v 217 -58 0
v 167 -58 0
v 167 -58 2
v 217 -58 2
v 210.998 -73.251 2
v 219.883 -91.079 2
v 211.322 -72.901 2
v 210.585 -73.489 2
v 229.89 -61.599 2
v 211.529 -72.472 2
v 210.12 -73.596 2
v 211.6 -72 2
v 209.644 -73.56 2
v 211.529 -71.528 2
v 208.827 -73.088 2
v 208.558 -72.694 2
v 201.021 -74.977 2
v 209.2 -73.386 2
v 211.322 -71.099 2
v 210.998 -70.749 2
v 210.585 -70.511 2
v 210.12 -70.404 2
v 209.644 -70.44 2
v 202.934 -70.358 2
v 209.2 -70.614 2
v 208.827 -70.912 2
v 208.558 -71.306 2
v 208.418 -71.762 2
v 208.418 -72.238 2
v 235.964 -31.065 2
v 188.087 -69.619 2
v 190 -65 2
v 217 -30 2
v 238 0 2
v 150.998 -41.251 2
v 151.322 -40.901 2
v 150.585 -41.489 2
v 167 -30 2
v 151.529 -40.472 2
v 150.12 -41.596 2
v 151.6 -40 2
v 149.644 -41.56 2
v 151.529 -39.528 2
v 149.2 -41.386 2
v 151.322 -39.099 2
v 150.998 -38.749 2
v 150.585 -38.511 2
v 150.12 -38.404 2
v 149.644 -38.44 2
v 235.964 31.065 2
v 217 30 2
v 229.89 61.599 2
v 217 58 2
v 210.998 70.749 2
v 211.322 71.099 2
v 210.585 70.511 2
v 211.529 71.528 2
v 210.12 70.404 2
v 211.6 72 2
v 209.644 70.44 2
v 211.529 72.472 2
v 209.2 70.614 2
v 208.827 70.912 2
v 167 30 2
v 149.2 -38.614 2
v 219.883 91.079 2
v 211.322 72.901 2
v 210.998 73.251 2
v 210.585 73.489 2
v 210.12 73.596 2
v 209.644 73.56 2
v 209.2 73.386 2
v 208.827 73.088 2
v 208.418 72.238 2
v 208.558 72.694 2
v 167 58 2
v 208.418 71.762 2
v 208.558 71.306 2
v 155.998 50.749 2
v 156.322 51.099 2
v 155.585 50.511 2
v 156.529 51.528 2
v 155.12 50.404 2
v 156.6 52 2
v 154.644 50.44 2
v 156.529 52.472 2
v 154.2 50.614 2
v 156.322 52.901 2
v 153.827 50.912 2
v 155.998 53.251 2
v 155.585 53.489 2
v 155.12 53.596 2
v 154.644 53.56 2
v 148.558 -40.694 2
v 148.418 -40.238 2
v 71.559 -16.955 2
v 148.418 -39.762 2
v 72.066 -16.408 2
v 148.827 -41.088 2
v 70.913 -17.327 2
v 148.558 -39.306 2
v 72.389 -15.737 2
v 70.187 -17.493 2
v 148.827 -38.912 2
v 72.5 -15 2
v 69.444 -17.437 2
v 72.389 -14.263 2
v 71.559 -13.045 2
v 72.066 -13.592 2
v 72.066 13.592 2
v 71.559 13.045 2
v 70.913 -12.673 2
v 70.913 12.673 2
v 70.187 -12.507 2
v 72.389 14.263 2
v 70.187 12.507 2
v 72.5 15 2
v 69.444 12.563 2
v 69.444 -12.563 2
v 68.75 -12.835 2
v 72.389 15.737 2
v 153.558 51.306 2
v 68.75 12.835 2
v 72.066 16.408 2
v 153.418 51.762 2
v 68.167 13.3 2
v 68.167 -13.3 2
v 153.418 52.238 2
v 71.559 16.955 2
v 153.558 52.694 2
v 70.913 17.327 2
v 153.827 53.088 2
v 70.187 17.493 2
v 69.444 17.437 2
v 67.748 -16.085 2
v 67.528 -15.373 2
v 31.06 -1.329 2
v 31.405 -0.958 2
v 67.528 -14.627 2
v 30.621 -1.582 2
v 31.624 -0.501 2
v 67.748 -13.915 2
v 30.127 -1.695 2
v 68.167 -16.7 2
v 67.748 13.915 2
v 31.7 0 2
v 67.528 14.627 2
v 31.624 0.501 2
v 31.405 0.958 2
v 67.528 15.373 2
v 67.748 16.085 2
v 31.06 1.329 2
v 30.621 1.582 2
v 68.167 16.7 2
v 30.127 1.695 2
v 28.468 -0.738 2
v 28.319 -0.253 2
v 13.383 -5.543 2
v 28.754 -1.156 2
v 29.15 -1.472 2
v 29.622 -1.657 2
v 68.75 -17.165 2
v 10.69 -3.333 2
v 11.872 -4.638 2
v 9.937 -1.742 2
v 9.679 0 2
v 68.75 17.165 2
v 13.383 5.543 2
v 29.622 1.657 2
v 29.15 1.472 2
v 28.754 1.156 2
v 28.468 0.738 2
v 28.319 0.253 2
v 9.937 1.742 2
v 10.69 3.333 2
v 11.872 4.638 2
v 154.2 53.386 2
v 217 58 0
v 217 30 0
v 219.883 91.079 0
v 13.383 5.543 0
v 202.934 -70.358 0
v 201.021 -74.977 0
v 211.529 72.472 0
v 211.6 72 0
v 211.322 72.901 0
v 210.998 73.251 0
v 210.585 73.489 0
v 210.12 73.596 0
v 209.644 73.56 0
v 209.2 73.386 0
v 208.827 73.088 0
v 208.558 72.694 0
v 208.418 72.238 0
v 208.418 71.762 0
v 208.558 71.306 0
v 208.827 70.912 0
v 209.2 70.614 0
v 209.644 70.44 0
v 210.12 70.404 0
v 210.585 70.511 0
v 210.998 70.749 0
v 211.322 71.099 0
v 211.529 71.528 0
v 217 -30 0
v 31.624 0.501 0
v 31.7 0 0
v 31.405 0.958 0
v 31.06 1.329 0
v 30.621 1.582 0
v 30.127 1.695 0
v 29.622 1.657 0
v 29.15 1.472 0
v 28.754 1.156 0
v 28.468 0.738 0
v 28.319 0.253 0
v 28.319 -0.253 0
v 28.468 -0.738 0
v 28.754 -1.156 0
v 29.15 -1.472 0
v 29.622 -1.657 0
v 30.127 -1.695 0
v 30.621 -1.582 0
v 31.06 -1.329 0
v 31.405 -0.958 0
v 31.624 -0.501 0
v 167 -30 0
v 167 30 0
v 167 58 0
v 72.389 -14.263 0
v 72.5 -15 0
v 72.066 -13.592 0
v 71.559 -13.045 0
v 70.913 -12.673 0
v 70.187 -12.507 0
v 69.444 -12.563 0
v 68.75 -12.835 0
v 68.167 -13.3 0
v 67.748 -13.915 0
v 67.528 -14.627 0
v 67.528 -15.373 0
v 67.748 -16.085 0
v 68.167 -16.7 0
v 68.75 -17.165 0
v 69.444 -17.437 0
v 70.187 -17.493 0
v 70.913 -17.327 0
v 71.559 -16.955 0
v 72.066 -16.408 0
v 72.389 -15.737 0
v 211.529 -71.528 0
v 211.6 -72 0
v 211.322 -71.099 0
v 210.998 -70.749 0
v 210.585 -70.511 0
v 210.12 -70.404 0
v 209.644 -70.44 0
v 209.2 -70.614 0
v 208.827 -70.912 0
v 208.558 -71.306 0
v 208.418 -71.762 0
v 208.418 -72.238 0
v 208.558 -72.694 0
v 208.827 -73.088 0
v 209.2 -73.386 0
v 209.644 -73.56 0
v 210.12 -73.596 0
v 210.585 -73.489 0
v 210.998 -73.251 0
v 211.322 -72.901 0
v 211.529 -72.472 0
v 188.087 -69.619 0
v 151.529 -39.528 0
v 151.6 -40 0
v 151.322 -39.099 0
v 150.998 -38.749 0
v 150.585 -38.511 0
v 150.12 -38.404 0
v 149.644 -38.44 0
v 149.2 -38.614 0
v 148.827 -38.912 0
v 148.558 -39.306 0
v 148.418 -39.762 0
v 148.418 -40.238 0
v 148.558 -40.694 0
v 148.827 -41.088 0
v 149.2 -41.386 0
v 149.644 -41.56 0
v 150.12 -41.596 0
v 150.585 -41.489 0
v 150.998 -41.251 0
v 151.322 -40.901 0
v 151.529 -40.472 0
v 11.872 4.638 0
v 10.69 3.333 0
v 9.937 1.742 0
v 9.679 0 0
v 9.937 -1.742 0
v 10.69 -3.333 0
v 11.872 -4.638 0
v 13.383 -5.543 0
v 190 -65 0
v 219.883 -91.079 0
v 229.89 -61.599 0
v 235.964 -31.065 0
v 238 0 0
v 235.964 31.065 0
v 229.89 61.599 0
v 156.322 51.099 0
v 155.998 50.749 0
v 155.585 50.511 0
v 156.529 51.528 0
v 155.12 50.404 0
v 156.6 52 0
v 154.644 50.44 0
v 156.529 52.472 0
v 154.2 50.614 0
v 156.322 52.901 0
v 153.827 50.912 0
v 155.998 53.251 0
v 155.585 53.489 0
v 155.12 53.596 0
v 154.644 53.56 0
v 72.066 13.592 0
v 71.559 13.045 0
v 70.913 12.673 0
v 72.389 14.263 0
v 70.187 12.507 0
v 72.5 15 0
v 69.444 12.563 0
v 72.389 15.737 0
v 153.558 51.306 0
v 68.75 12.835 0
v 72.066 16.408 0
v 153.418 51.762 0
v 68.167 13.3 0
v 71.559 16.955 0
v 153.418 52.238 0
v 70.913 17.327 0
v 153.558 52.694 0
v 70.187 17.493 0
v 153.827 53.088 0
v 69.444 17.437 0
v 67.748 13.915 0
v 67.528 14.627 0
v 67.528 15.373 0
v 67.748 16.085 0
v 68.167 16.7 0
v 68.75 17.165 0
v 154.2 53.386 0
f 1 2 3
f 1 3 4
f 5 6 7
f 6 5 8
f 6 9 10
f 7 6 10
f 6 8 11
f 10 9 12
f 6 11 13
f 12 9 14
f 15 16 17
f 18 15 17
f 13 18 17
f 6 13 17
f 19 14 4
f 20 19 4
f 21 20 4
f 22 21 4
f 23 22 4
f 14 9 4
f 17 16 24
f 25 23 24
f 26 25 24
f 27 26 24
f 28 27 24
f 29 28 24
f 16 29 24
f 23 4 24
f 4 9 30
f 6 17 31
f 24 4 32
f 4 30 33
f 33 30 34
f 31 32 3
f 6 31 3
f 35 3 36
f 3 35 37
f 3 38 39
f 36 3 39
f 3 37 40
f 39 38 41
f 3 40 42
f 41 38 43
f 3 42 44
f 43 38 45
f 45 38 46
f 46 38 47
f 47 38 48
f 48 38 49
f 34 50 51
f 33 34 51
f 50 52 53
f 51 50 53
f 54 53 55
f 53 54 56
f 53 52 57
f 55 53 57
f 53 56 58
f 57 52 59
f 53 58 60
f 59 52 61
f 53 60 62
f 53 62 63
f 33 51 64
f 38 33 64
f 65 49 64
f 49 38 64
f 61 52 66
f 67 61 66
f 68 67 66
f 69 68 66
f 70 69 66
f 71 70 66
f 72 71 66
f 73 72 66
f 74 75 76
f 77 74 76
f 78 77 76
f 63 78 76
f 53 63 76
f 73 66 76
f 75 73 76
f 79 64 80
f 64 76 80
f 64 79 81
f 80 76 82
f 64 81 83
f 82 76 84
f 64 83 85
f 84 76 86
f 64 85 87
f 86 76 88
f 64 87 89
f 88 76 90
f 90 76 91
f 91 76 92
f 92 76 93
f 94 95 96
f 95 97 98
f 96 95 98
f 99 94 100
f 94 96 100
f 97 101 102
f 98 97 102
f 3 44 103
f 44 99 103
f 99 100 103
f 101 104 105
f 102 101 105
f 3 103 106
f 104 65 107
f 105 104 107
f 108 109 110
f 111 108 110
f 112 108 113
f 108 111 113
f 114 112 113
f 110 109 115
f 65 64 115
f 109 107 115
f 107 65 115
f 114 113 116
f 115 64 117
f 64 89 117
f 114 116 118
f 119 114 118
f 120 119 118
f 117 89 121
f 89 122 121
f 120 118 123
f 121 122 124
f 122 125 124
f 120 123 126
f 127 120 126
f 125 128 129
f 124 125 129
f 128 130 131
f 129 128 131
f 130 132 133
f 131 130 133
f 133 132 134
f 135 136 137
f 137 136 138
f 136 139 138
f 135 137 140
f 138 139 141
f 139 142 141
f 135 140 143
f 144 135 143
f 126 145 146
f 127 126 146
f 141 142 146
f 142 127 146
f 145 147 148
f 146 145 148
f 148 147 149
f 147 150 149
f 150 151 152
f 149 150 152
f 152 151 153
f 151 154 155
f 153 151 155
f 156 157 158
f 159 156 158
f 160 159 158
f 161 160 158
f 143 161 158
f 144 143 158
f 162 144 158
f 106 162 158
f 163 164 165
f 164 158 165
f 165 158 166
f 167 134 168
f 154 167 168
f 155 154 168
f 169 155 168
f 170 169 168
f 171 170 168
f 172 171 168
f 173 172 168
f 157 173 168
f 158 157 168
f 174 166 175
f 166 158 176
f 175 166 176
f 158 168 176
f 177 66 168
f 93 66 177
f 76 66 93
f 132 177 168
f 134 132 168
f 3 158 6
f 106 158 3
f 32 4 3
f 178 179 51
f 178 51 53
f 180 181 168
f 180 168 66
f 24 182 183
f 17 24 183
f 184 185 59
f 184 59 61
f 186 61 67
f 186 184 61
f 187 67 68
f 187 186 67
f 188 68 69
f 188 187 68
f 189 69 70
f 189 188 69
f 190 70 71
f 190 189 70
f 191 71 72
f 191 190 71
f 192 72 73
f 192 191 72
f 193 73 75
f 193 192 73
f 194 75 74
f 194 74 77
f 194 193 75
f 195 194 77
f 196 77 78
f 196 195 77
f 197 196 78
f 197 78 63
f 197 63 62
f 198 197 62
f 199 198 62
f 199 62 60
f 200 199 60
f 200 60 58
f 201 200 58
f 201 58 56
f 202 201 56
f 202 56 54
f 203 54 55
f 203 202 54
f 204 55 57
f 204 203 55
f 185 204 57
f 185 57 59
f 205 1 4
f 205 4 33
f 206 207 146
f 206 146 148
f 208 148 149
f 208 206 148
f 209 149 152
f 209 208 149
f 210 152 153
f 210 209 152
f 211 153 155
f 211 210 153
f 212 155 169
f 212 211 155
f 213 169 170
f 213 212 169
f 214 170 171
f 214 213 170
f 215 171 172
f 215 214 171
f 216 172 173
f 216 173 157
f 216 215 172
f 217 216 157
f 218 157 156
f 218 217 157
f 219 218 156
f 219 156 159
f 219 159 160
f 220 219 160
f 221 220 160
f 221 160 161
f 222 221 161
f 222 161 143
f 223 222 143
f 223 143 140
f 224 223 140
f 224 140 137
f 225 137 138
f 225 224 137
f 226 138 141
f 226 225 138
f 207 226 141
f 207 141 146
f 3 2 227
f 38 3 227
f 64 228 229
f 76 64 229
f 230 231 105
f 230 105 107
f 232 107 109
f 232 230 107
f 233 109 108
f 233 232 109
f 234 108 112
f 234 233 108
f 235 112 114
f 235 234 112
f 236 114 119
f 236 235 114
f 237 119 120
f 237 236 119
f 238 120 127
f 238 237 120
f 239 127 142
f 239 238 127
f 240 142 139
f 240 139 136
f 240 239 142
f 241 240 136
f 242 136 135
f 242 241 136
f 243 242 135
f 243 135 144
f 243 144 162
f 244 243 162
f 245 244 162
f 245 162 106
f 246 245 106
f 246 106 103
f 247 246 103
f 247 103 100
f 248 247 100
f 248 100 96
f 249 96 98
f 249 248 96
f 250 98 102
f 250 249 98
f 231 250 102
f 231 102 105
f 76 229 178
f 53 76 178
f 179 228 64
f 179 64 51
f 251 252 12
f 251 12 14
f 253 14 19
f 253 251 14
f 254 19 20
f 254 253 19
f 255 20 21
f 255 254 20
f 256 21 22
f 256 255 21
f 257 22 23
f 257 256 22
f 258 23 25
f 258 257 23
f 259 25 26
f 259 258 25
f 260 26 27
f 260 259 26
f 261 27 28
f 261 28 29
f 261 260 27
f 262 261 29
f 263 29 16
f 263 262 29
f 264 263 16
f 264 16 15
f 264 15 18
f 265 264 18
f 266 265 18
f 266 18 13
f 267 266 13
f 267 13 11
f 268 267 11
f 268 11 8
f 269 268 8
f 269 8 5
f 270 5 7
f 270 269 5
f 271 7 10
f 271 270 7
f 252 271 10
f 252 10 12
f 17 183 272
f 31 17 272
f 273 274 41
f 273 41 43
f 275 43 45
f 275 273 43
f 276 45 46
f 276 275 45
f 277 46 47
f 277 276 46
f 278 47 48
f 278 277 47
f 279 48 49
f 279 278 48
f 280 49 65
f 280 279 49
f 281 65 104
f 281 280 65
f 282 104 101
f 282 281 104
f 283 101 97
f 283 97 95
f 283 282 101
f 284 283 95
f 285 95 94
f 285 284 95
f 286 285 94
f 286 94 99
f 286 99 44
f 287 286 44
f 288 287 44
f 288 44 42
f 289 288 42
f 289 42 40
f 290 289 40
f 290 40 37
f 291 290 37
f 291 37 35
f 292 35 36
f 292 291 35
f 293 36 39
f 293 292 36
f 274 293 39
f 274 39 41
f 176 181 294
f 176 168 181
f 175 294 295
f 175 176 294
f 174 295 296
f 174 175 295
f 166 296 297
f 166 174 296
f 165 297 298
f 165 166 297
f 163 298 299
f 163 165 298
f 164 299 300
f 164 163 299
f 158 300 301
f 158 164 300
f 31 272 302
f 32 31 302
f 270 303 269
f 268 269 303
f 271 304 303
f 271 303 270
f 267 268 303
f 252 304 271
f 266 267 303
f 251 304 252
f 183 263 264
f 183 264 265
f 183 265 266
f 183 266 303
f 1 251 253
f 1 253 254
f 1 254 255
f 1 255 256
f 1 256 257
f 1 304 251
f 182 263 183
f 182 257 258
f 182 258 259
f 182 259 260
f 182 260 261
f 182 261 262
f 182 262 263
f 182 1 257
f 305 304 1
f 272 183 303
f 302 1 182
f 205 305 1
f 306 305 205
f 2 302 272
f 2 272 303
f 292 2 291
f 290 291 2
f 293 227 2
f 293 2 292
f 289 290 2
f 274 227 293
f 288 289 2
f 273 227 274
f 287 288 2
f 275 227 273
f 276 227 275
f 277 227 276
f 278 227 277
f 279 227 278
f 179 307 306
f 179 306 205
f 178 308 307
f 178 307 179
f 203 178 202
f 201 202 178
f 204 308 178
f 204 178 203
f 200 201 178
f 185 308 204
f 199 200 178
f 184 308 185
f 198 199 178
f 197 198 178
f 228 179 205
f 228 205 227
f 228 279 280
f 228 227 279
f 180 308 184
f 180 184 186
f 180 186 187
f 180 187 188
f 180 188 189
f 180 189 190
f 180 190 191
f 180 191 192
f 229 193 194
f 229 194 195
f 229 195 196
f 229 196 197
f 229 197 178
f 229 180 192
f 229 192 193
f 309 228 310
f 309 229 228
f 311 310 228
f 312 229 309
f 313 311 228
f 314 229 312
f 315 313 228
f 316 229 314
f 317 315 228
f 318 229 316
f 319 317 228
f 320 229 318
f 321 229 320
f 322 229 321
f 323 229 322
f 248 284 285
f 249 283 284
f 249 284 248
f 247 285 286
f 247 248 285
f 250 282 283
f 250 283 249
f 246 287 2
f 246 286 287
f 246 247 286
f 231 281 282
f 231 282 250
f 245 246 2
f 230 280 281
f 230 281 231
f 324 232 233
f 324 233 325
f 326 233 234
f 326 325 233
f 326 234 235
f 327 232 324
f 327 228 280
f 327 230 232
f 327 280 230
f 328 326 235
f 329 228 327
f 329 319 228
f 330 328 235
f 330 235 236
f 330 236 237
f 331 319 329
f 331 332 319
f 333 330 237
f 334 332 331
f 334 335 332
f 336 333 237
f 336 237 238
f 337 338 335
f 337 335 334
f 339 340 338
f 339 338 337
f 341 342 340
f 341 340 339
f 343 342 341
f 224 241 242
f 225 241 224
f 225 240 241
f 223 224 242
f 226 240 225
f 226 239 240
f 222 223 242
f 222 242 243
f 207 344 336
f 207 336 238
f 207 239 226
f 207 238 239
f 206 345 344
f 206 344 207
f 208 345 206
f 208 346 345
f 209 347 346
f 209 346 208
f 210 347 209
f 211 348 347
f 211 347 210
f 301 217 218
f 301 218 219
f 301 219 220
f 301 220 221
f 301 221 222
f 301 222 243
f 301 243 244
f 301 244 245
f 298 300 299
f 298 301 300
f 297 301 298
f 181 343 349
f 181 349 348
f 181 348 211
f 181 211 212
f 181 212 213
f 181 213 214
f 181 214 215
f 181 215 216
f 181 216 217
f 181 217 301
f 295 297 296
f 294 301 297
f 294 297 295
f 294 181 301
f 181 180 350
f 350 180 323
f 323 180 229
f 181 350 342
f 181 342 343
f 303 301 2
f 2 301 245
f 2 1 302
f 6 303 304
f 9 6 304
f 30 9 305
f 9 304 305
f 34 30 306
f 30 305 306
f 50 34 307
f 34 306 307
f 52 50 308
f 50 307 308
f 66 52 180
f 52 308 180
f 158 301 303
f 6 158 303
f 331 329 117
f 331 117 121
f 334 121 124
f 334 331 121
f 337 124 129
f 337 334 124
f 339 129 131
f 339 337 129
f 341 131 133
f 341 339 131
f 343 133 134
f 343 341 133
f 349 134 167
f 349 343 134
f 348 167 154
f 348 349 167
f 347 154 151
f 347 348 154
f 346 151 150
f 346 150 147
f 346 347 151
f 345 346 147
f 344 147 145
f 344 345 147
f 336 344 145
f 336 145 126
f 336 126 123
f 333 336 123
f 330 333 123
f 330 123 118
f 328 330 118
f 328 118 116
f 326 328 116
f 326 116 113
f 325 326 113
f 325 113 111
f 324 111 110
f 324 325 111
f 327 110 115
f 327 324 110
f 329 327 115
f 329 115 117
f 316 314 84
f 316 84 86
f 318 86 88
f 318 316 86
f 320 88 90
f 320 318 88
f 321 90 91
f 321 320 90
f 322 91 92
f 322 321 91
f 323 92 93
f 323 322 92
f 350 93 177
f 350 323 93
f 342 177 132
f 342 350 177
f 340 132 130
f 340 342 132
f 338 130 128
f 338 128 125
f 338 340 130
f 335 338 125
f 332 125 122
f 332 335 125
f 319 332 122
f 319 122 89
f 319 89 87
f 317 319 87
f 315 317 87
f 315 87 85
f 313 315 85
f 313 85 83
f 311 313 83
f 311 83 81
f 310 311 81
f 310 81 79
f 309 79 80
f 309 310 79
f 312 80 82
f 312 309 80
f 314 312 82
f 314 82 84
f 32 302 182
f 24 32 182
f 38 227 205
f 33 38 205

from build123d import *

# Parameters (mm, degrees)
SKETCH_R   = 1.6
SKETCH_R_2 = 1.7
SKETCH_R_3 = 2.5
SKETCH_W   = 50
SKETCH_H   = 28
PAD_DEPTH  = 2
FILLET_R   = 6


with BuildPart() as part:
    # Sketch → Pad (new body)
    with BuildSketch(Plane.XY):
        with BuildLine():
            Line((0, 0), (219.883329, 91.078657))
            ThreePointArc((219.883329, -91.078657), (238, 0), (219.883329, 91.078657))
            Line((0, 0), (219.883329, -91.078657))
        make_face()
        with Locations((155, 52)):
            Circle(SKETCH_R, mode=Mode.SUBTRACT)
        with Locations((150, -40)):
            Circle(SKETCH_R, mode=Mode.SUBTRACT)
        with Locations((210, 72)):
            Circle(SKETCH_R, mode=Mode.SUBTRACT)
        with Locations((210, -72)):
            Circle(SKETCH_R, mode=Mode.SUBTRACT)
        with Locations((30, 0)):
            Circle(SKETCH_R_2, mode=Mode.SUBTRACT)
        with Locations((70, 15)):
            Circle(SKETCH_R_3, mode=Mode.SUBTRACT)
        with Locations((70, -15)):
            Circle(SKETCH_R_3, mode=Mode.SUBTRACT)
        with Locations((192, 44)):
            Rectangle(SKETCH_W, SKETCH_H, mode=Mode.SUBTRACT)
        with Locations((192, -44)):
            Rectangle(SKETCH_W, SKETCH_H, mode=Mode.SUBTRACT)
        Polygon((190, -65), (202.934313, -70.357568), (201.020896, -74.976966), (188.086583, -69.619398), align=None, mode=Mode.SUBTRACT)
    extrude(amount=PAD_DEPTH)

    # Fillet
    fillet_edges = [part.edges().sort_by_distance(p)[0] for p in [
        (0, 0, 1),
    ]]
    fillet(fillet_edges, radius=FILLET_R)


solid = part.part
